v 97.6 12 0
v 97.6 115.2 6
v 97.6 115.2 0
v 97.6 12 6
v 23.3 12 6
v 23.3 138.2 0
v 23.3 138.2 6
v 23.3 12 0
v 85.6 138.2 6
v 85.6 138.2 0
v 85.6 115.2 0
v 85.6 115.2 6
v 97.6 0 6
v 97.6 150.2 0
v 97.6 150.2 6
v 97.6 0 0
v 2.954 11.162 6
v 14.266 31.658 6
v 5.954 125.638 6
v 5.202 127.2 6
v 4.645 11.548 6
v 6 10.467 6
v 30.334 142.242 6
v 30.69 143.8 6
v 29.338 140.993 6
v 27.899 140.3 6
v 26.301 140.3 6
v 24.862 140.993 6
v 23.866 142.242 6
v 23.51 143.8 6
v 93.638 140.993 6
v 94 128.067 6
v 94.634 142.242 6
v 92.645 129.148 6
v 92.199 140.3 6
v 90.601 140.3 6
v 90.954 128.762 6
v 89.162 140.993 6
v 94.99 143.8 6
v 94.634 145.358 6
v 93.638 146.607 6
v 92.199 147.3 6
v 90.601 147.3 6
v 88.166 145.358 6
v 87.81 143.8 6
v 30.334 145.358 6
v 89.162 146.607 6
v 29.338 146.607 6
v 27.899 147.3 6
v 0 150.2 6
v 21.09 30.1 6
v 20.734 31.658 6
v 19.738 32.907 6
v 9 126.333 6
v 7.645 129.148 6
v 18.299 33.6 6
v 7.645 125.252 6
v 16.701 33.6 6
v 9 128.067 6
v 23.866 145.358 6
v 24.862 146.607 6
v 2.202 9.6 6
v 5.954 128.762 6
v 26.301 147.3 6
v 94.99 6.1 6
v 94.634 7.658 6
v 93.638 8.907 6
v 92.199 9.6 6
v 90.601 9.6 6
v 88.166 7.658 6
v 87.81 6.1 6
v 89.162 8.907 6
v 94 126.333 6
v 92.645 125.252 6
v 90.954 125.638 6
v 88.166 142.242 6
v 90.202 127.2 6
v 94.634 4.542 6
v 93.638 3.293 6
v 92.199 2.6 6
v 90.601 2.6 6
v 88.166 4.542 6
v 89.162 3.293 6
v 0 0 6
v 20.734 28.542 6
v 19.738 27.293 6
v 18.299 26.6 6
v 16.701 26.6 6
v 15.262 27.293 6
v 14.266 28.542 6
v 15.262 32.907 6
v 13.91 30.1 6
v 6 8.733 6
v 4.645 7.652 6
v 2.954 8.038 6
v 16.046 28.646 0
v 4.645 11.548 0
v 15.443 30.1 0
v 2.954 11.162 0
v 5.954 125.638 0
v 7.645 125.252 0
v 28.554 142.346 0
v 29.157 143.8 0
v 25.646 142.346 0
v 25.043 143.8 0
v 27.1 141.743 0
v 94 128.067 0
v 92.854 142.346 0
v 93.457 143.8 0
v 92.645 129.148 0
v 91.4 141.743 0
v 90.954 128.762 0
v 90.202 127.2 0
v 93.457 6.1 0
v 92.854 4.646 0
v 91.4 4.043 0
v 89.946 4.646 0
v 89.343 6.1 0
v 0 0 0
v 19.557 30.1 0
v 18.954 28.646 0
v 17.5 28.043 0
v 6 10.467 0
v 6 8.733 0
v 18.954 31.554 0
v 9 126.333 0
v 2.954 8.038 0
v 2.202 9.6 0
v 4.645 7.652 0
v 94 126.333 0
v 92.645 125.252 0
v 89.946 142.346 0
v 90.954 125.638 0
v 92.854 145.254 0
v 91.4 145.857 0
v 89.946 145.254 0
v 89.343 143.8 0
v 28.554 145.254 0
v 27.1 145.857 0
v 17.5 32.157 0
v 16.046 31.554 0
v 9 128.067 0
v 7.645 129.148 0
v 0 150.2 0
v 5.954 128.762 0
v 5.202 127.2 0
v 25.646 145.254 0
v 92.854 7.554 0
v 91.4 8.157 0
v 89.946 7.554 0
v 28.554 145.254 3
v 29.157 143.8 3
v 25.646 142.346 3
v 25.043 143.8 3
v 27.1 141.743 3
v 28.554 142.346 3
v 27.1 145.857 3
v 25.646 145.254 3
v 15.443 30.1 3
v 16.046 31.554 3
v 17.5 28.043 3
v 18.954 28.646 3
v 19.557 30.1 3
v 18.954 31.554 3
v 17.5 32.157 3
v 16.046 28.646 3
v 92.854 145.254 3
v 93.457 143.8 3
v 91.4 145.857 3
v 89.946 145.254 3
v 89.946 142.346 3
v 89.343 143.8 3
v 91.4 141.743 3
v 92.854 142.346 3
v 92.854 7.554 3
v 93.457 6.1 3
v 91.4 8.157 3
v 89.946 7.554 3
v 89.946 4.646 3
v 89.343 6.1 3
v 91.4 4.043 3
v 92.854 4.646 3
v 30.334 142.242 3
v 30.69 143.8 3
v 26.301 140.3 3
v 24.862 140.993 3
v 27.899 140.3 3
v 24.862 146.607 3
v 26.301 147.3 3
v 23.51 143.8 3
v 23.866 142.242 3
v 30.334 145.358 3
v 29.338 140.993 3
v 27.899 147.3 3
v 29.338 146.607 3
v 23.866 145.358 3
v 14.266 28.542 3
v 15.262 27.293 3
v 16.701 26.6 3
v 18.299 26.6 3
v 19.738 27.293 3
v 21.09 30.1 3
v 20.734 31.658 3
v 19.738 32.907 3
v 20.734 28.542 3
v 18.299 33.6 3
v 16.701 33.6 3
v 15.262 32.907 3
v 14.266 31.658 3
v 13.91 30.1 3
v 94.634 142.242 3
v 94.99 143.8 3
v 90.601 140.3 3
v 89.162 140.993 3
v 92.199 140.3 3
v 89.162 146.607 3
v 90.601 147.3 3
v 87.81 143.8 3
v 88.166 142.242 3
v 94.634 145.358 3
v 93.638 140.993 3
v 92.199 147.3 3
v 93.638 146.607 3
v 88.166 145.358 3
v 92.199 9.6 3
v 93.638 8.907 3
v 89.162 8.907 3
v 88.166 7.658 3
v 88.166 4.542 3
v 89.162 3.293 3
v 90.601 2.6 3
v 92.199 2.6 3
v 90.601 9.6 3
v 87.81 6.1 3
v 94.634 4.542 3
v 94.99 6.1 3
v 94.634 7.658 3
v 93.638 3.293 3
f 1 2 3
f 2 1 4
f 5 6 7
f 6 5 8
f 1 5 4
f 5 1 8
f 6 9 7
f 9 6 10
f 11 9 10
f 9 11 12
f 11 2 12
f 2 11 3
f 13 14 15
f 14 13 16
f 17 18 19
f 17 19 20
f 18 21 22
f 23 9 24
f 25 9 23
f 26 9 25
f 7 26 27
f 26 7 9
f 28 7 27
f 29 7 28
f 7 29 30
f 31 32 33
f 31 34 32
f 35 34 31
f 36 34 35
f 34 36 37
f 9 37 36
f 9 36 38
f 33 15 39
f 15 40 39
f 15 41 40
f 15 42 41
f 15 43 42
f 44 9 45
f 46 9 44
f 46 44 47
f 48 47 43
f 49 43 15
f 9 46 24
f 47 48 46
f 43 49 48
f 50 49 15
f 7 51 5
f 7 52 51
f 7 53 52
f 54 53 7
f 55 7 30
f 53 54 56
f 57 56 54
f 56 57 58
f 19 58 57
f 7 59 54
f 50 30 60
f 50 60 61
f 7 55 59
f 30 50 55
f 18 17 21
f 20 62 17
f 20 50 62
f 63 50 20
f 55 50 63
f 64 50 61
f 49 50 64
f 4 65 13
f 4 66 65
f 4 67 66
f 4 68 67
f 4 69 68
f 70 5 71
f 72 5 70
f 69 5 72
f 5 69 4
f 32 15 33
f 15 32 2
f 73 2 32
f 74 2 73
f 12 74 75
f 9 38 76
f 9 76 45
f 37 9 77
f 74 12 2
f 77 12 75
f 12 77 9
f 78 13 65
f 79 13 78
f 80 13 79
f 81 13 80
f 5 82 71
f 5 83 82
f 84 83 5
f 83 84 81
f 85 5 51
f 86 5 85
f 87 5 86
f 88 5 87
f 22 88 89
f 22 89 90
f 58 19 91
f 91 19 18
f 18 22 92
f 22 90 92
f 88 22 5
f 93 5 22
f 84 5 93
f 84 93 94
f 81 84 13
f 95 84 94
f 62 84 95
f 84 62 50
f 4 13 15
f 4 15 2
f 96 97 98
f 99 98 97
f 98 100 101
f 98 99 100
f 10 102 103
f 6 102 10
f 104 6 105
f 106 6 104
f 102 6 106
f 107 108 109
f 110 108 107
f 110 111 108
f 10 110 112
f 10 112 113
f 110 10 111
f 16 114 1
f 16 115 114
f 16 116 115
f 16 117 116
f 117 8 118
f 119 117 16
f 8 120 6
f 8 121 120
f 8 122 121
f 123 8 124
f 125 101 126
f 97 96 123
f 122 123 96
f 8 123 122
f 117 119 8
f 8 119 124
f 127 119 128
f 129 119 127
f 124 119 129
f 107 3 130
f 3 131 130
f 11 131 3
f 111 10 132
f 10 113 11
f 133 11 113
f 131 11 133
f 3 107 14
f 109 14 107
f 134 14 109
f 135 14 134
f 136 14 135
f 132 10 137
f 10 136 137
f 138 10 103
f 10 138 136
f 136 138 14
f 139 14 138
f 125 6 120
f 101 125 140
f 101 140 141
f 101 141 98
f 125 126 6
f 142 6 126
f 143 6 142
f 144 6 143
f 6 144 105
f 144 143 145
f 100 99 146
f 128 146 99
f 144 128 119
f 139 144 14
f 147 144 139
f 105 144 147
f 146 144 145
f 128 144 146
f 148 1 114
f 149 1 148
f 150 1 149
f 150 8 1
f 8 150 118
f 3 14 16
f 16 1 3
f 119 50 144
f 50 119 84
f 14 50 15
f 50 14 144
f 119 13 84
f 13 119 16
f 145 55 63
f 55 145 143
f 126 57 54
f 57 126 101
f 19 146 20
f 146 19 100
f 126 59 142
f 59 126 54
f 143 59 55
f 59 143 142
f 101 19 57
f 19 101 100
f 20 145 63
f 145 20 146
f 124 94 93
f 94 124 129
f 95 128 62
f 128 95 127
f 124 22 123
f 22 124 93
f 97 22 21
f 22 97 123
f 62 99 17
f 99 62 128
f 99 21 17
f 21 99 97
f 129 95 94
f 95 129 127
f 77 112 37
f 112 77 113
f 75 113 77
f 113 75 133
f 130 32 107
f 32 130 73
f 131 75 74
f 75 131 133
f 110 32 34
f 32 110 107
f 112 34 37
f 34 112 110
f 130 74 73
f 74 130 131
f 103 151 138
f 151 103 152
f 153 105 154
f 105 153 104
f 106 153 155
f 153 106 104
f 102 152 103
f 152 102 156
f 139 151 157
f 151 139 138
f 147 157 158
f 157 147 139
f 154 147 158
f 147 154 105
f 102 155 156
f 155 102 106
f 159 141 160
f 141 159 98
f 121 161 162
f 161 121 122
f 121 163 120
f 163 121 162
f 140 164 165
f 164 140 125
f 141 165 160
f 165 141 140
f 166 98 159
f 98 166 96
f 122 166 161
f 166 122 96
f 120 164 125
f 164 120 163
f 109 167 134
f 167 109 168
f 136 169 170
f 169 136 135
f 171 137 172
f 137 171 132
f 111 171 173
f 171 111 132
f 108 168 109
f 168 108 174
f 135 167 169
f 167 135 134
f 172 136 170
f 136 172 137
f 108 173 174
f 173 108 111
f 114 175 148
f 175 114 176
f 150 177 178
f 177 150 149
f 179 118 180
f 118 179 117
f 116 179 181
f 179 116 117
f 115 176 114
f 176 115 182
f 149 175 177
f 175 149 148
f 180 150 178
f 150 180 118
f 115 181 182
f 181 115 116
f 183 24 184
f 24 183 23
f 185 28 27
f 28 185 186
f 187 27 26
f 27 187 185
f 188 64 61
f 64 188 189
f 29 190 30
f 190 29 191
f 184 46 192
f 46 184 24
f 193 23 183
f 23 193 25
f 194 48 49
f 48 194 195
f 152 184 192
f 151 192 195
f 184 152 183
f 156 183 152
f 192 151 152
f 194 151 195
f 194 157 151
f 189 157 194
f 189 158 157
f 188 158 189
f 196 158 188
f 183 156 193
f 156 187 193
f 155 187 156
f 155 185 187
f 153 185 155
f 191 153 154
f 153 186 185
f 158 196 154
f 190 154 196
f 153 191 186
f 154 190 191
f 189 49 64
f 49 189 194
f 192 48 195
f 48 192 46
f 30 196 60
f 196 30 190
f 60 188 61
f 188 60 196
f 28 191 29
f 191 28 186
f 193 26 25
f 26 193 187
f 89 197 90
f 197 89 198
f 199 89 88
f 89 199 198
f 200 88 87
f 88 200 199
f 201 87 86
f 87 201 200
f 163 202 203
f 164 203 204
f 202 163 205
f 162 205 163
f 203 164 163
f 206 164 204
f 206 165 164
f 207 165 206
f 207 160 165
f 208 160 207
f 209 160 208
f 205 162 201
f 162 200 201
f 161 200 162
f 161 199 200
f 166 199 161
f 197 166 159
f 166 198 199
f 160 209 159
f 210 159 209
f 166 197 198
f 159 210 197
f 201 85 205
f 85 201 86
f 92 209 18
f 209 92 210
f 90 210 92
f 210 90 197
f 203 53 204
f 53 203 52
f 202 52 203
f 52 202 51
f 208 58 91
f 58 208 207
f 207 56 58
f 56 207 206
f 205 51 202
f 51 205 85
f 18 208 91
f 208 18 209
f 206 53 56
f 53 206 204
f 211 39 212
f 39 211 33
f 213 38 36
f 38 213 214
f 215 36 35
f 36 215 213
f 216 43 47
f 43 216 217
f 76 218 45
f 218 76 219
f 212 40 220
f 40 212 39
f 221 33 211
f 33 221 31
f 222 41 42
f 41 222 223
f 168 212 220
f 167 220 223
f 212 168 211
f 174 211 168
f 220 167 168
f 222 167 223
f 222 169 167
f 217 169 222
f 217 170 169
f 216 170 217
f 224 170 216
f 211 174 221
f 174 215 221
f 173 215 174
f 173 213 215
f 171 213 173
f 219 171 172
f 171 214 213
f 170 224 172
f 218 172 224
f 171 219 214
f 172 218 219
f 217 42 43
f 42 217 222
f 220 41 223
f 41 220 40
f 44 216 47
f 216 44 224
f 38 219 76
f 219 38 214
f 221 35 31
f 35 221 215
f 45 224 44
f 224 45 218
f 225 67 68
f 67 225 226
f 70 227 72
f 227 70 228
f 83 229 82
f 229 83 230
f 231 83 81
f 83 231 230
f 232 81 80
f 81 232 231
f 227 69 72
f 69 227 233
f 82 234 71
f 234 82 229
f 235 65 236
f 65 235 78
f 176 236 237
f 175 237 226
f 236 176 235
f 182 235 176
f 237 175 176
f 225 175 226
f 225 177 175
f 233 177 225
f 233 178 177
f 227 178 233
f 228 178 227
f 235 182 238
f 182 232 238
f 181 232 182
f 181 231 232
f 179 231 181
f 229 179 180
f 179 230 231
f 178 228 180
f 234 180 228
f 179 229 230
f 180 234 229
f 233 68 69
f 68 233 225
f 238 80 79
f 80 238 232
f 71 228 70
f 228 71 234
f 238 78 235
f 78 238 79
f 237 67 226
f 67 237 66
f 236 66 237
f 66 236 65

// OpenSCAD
use <MCAD/polyholes.scad>
E=0.01;

hpx=97.6;
hpy=150.2;

hp1x=7.2;
hp1y=hpy-23;
hp2x=4.2;
hp2y=9.6;
hp3x=hpx-5.4;
hp3y=hpy-23;
hp4x=hpx-5.6;
hp4y=9.6;


novx=86.3;
novy=150.2;

nov1x=hpx-novx + 15.8;
nov1y=novy-6.4;
nov2x=hpx-novx + 6.2;
nov2y=30.1;
nov3x=hpx-6.2;
nov3y=hpy-6.4;
nov4x=hpx-6.2;
nov4y=6.1;

depth=6;
width=12;



difference () {
// hp power size
cube(size=[hpx,hpy,depth]);


// cutout nova powersize - width
translate(v=[hpx-novx,0,-1])
    difference() {
        // nova power size
        cube(size=[novx, novy, depth + 2]);
        // add width all round
        cube(size=[width,hpy,depth + 2]);
        cube(size=[hpx,width,depth + 2]);
        translate(v=[0,novy-width,0])
            cube(size=[hpx,width,depth + 2]);
        translate(v=[novx-width,hp3y-width,0])
            cube(size=[width,novy - hp3y + width,depth + 2]);
    }

    // HP Holes
    translate(v=[hp1x,hp1y,-1])
        polyhole(h=depth+2, d=3.6);
    translate(v=[hp2x,hp2y,-1])
        polyhole(h=depth+2, d=3.6);
    translate(v=[hp3x,hp3y,-1])
        polyhole(h=depth+2, d=3.6);
// Too close to nov4
//    translate(v=[hp4x,hp4y,-1])
//        polyhole(h=depth+2, d=3.6);

    // Nova Holes
    translate(v=[nov1x,nov1y,-1])
        polyhole(h=depth+2, d=3.8);
    translate(v=[nov2x,nov2y,-1])
        polyhole(h=depth+2, d=3.8);
    translate(v=[nov3x,nov3y,-1])
        polyhole(h=depth+2, d=3.8);
    translate(v=[nov4x,nov4y,-1])
        polyhole(h=depth+2, d=3.8);

    // Sink Heads Nova Holes
    translate(v=[nov1x,nov1y,depth-3])
        polyhole(h=4, d=7);
    translate(v=[nov2x,nov2y,depth-3])
        polyhole(h=4, d=7);
    translate(v=[nov3x,nov3y,depth-3])
        polyhole(h=4, d=7);
    translate(v=[nov4x,nov4y,depth-3])
        polyhole(h=4, d=7);
}
